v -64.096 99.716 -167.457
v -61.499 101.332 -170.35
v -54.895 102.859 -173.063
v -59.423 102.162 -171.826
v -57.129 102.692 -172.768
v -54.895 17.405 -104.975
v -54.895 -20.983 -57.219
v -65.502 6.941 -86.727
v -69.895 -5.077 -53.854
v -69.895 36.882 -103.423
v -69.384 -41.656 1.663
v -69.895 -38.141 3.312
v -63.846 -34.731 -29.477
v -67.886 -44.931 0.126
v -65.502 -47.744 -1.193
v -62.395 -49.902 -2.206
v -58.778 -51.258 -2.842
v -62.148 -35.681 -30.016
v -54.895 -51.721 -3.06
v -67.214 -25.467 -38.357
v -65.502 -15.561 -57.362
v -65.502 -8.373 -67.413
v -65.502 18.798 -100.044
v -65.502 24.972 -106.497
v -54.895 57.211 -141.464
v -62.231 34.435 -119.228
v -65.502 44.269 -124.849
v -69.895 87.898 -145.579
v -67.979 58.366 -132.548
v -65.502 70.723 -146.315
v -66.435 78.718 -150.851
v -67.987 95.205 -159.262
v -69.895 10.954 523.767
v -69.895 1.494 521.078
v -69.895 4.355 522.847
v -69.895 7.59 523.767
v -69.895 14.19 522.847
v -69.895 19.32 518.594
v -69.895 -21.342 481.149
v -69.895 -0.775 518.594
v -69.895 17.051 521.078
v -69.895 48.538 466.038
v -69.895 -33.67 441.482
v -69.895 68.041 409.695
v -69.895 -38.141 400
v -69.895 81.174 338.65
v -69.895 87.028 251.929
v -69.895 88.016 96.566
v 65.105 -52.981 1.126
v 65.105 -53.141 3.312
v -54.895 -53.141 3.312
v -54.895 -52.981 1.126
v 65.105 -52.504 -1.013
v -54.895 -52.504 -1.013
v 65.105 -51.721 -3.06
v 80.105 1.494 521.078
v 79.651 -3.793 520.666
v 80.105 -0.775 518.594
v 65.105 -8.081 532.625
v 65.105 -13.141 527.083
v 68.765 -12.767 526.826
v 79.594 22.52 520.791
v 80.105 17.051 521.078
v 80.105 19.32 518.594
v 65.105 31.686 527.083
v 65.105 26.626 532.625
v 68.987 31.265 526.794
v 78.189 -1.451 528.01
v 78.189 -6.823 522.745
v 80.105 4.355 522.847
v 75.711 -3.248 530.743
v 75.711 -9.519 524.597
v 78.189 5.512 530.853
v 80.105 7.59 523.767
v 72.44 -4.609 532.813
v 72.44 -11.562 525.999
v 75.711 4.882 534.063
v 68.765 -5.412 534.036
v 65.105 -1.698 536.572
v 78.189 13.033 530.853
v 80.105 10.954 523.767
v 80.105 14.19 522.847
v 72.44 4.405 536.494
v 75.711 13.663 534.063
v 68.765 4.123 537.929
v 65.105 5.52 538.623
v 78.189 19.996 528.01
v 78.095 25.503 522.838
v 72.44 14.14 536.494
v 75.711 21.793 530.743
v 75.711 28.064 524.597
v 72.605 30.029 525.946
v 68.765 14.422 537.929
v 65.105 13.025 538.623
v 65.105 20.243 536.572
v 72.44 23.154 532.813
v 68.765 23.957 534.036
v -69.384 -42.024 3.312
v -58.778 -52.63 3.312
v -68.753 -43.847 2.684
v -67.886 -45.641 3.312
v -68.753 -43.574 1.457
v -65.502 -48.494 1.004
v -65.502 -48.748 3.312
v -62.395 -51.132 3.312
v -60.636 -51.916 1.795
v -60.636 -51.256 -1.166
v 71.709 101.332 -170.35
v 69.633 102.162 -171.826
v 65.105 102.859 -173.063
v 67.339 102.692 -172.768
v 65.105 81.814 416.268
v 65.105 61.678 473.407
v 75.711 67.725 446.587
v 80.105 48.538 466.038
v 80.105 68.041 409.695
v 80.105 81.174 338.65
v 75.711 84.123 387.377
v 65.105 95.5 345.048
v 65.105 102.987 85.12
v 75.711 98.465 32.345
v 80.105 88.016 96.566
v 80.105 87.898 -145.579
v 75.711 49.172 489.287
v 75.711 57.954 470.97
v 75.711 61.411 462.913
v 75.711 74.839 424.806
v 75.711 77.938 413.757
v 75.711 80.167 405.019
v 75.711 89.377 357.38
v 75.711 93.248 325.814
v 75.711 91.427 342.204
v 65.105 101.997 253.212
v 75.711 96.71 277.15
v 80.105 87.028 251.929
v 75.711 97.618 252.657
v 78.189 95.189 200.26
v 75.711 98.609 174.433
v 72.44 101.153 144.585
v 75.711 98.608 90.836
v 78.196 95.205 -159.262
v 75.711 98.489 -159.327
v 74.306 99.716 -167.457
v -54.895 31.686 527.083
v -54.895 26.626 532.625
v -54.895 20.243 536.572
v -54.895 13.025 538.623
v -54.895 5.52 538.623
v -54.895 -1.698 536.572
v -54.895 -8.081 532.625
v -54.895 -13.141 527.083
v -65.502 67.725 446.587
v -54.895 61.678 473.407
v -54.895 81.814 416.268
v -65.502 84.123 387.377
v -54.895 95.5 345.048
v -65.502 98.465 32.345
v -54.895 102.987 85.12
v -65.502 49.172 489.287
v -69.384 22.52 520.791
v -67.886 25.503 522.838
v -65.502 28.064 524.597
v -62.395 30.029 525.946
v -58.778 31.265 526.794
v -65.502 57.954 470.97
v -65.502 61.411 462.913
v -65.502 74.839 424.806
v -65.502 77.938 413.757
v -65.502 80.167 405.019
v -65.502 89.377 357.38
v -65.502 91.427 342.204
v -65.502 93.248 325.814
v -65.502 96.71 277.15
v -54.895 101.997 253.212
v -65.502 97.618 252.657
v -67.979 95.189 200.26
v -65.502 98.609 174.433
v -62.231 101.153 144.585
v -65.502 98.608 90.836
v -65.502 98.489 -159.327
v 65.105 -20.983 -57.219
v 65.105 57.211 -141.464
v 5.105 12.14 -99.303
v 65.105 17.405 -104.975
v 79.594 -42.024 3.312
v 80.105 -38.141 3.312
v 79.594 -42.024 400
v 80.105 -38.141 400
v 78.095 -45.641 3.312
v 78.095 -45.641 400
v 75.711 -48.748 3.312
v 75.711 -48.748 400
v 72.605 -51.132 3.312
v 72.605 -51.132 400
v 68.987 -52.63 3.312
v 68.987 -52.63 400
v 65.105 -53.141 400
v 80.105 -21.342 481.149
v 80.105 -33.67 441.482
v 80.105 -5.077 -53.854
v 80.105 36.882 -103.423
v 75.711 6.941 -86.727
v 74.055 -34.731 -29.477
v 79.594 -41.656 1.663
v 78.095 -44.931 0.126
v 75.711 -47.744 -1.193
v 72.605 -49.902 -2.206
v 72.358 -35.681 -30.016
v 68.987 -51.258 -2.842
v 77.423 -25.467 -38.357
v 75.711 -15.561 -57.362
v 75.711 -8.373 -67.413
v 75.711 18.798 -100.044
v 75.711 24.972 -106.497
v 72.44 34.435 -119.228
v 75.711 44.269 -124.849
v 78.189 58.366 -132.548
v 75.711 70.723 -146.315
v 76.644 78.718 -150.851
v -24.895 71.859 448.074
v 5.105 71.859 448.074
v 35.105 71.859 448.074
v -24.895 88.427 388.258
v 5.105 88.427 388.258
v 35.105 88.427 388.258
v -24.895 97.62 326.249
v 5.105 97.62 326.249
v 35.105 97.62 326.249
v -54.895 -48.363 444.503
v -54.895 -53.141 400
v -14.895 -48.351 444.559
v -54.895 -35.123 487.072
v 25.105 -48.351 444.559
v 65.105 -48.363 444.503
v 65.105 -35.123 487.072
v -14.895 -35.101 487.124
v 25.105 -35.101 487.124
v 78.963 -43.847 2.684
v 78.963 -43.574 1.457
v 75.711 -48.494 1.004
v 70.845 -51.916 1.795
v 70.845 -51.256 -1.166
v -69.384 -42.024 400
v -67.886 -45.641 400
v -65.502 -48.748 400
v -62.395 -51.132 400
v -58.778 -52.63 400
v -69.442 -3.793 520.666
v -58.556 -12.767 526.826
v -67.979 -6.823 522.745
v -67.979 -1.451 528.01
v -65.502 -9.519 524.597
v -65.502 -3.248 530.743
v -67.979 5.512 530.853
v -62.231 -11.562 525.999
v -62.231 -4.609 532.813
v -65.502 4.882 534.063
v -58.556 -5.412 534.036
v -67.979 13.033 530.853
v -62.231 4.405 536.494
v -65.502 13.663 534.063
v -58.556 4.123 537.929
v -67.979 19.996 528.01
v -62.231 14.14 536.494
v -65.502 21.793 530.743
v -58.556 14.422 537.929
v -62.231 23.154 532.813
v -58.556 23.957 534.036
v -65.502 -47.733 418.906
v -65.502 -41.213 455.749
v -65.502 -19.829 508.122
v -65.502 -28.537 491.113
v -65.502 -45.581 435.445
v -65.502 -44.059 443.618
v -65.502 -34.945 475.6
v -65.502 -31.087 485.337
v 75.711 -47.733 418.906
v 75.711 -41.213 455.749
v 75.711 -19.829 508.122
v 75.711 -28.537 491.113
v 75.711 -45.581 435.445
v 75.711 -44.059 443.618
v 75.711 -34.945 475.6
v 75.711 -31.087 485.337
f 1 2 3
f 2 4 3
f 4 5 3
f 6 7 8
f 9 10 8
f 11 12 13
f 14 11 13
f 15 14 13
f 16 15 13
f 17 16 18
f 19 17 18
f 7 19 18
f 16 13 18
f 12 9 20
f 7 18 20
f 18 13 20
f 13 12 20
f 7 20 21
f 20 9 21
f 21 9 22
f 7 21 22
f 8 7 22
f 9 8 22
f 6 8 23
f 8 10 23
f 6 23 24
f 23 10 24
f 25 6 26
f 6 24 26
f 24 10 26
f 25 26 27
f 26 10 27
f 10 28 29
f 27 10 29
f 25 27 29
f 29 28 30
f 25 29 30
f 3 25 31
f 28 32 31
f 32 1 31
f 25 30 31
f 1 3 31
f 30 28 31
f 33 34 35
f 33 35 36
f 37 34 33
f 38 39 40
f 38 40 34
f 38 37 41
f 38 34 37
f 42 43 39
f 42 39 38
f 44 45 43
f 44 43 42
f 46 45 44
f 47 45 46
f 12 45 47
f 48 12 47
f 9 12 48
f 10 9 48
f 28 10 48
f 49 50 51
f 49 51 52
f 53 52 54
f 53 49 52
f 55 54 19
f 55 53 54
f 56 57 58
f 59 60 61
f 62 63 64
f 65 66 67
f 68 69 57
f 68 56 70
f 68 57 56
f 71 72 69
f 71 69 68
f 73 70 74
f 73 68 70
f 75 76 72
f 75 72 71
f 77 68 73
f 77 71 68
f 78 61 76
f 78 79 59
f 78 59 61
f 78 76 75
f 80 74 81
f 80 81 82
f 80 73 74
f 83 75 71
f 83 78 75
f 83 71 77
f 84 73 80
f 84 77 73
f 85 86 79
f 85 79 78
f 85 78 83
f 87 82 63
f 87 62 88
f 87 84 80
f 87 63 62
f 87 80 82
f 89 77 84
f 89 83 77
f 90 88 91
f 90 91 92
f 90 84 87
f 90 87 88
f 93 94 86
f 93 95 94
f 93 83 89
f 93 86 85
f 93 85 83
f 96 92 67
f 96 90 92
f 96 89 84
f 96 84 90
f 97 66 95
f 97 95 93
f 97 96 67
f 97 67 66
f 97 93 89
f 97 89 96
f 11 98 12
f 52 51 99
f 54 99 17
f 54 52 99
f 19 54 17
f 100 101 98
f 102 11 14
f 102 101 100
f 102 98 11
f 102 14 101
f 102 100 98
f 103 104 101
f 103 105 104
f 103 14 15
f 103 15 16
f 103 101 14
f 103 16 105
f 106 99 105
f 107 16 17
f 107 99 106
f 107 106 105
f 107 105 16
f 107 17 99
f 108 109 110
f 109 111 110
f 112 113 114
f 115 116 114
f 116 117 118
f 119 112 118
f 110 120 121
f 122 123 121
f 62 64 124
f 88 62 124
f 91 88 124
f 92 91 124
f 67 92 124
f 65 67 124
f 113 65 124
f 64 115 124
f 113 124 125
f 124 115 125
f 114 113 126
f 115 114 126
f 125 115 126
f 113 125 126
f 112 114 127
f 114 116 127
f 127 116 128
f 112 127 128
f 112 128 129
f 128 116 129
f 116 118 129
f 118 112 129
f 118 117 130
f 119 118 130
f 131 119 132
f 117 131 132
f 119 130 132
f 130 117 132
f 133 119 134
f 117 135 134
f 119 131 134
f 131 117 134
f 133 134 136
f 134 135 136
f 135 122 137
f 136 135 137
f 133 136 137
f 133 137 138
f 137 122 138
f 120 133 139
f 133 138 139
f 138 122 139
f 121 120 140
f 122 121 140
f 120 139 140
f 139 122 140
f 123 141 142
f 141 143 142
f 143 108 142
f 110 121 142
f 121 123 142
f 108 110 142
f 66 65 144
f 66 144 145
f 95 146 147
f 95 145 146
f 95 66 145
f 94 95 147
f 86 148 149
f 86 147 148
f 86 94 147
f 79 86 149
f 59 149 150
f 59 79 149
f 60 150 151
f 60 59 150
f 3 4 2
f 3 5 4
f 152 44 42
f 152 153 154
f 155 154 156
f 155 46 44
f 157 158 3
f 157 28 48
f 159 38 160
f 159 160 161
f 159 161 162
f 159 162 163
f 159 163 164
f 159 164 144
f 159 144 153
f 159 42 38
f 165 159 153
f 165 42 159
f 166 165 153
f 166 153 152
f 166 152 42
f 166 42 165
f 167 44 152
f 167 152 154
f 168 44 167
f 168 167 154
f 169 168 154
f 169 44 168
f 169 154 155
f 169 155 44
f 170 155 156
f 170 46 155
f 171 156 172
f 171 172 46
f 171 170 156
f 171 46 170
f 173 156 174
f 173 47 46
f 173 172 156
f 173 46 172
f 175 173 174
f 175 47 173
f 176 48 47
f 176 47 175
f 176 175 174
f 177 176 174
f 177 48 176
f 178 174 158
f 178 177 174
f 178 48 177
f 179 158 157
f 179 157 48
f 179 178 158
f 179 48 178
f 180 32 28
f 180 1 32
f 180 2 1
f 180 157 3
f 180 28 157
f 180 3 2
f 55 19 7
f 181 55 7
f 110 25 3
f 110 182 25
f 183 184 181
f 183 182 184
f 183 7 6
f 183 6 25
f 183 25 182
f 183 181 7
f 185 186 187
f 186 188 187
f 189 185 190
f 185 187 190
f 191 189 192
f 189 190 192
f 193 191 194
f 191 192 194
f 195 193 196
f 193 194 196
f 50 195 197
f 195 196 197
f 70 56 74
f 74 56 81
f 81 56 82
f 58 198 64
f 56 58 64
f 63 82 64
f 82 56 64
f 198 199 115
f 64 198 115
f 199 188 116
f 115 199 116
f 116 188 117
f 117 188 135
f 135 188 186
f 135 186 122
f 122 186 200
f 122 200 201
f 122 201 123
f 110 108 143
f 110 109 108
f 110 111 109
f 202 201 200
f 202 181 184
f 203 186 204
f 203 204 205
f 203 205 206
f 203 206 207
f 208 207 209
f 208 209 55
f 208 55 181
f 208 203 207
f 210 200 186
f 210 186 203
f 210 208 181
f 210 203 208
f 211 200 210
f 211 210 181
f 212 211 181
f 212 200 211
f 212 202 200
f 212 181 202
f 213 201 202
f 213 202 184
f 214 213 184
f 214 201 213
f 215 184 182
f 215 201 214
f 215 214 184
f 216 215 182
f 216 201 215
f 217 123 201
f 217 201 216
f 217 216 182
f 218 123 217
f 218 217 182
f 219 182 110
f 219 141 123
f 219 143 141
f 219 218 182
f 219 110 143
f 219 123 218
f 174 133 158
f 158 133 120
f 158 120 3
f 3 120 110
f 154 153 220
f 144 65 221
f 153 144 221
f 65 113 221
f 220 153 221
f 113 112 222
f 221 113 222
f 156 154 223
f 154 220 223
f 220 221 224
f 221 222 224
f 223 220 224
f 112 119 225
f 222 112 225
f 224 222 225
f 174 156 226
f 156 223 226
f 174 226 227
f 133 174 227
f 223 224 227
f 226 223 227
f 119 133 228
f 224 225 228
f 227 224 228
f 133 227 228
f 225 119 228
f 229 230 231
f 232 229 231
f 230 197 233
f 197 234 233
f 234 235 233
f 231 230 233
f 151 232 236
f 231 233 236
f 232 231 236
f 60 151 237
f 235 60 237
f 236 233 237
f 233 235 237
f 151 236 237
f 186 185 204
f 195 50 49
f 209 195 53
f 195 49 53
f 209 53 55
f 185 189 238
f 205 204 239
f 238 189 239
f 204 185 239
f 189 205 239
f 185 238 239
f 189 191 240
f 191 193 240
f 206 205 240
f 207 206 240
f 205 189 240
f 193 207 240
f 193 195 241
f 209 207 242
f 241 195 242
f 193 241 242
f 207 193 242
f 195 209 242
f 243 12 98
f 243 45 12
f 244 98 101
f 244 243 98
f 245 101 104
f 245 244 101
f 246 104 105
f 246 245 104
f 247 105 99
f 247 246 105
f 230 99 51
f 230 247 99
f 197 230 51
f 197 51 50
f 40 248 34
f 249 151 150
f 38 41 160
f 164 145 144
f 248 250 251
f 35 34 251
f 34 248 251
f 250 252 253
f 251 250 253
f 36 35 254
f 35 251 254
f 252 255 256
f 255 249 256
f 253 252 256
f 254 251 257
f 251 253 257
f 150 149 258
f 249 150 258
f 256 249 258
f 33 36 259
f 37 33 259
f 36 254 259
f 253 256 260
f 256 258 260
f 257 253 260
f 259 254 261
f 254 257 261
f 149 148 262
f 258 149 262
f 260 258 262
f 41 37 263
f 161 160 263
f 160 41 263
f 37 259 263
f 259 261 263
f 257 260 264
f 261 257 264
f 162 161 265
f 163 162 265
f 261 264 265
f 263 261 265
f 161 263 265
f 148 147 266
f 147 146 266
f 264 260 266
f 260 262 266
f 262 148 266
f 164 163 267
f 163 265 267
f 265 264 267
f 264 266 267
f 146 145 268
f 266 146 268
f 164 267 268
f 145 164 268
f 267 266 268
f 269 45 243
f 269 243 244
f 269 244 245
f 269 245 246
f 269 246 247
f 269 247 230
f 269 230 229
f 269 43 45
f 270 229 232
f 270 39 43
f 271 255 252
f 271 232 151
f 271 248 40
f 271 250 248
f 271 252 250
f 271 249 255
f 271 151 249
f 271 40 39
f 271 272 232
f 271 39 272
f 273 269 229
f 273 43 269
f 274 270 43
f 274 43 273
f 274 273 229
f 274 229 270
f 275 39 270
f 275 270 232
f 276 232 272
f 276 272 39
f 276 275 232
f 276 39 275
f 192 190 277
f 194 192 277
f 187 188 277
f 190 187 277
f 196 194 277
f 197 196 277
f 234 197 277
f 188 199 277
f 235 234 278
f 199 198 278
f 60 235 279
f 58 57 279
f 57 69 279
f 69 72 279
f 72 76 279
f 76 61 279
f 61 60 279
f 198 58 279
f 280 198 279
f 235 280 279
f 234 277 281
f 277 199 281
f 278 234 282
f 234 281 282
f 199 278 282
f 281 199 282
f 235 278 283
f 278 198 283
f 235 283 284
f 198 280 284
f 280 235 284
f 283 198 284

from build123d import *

# Parameters (mm, degrees)
SKETCH1_W           = 150
SKETCH1_H           = 125
BOSS_EXTRUDE1_DEPTH = 400
BOSS_EXTRUDE2_DEPTH = 150
FILLET1_R           = 15


with BuildPart() as part:
    # Sketch1 → Boss-Extrude1 (new body)
    with BuildSketch(Plane.XY):
        with Locations((5.104712042, 9.358638743)):
            Rectangle(SKETCH1_W, SKETCH1_H)
    extrude(amount=BOSS_EXTRUDE1_DEPTH)

    # Sketch2 → Boss-Extrude2 (add)
    with BuildSketch(Plane(origin=(80.104712042, 0, 0), x_dir=(0, 0, -1), z_dir=(1, 0, 0))):
        with BuildLine():
            Line((-400, -53.141361257), (0, -53.141361257))
            add(Edge.make_bspline(
                [(0, -53.141361257), (109.657757417, -2.76599099), (173.063054437, 102.858638743)],
                knots=[0, 0, 0, 1, 1, 1], degree=2))
            add(Edge.make_bspline(
                [(-527.083058108, 31.686270557), (-502.130544308, 48.8156408), (-400.791671341, 99.030121285), (-226.177268831, 103.790992089), (-20.030650849, 102.536192565), (104.776057331, 103.005042445), (173.063054437, 102.858638743)],
                knots=[0, 0, 0, 0, 0.124540201, 0.476334433, 0.711394185, 1, 1, 1, 1], degree=3))
            ThreePointArc((-527.083058108, 31.686270557), (-538.88333751, 9.27245465), (-527.083058108, -13.141361257))
            add(Edge.make_bspline(
                [(-400, -53.141361257), (-445.353522893, -52.497628707), (-488.629563407, -39.538867863), (-527.083058108, -13.141361257)],
                knots=[0, 0, 0, 0, 1, 1, 1, 1], degree=3))
        make_face()
    extrude(amount=-BOSS_EXTRUDE2_DEPTH)

    # Fillet1
    fillet1_edges = [part.edges().sort_by_distance(p)[0] for p in [
        (80.104712042, -42.668235376, 466.548321311),
        (80.104712042, 11.477981034, -98.572691707),
        (80.104712042, 102.961238591, 183.528114028),
        (80.104712042, 9.27245465, 538.88333751),
        (-69.895287958, -42.668235376, 466.548321311),
        (-69.895287958, 9.27245465, 538.88333751),
        (-69.895287958, 102.961238591, 183.528114028),
        (-69.895287958, 11.477981034, -98.572691707),
        (5.104712042, -53.141361257, 0),
        (80.104712042, -53.141361257, 200),
        (-69.895287958, -53.141361257, 200),
    ]]
    fillet(fillet1_edges, radius=FILLET1_R)


solid = part.part
